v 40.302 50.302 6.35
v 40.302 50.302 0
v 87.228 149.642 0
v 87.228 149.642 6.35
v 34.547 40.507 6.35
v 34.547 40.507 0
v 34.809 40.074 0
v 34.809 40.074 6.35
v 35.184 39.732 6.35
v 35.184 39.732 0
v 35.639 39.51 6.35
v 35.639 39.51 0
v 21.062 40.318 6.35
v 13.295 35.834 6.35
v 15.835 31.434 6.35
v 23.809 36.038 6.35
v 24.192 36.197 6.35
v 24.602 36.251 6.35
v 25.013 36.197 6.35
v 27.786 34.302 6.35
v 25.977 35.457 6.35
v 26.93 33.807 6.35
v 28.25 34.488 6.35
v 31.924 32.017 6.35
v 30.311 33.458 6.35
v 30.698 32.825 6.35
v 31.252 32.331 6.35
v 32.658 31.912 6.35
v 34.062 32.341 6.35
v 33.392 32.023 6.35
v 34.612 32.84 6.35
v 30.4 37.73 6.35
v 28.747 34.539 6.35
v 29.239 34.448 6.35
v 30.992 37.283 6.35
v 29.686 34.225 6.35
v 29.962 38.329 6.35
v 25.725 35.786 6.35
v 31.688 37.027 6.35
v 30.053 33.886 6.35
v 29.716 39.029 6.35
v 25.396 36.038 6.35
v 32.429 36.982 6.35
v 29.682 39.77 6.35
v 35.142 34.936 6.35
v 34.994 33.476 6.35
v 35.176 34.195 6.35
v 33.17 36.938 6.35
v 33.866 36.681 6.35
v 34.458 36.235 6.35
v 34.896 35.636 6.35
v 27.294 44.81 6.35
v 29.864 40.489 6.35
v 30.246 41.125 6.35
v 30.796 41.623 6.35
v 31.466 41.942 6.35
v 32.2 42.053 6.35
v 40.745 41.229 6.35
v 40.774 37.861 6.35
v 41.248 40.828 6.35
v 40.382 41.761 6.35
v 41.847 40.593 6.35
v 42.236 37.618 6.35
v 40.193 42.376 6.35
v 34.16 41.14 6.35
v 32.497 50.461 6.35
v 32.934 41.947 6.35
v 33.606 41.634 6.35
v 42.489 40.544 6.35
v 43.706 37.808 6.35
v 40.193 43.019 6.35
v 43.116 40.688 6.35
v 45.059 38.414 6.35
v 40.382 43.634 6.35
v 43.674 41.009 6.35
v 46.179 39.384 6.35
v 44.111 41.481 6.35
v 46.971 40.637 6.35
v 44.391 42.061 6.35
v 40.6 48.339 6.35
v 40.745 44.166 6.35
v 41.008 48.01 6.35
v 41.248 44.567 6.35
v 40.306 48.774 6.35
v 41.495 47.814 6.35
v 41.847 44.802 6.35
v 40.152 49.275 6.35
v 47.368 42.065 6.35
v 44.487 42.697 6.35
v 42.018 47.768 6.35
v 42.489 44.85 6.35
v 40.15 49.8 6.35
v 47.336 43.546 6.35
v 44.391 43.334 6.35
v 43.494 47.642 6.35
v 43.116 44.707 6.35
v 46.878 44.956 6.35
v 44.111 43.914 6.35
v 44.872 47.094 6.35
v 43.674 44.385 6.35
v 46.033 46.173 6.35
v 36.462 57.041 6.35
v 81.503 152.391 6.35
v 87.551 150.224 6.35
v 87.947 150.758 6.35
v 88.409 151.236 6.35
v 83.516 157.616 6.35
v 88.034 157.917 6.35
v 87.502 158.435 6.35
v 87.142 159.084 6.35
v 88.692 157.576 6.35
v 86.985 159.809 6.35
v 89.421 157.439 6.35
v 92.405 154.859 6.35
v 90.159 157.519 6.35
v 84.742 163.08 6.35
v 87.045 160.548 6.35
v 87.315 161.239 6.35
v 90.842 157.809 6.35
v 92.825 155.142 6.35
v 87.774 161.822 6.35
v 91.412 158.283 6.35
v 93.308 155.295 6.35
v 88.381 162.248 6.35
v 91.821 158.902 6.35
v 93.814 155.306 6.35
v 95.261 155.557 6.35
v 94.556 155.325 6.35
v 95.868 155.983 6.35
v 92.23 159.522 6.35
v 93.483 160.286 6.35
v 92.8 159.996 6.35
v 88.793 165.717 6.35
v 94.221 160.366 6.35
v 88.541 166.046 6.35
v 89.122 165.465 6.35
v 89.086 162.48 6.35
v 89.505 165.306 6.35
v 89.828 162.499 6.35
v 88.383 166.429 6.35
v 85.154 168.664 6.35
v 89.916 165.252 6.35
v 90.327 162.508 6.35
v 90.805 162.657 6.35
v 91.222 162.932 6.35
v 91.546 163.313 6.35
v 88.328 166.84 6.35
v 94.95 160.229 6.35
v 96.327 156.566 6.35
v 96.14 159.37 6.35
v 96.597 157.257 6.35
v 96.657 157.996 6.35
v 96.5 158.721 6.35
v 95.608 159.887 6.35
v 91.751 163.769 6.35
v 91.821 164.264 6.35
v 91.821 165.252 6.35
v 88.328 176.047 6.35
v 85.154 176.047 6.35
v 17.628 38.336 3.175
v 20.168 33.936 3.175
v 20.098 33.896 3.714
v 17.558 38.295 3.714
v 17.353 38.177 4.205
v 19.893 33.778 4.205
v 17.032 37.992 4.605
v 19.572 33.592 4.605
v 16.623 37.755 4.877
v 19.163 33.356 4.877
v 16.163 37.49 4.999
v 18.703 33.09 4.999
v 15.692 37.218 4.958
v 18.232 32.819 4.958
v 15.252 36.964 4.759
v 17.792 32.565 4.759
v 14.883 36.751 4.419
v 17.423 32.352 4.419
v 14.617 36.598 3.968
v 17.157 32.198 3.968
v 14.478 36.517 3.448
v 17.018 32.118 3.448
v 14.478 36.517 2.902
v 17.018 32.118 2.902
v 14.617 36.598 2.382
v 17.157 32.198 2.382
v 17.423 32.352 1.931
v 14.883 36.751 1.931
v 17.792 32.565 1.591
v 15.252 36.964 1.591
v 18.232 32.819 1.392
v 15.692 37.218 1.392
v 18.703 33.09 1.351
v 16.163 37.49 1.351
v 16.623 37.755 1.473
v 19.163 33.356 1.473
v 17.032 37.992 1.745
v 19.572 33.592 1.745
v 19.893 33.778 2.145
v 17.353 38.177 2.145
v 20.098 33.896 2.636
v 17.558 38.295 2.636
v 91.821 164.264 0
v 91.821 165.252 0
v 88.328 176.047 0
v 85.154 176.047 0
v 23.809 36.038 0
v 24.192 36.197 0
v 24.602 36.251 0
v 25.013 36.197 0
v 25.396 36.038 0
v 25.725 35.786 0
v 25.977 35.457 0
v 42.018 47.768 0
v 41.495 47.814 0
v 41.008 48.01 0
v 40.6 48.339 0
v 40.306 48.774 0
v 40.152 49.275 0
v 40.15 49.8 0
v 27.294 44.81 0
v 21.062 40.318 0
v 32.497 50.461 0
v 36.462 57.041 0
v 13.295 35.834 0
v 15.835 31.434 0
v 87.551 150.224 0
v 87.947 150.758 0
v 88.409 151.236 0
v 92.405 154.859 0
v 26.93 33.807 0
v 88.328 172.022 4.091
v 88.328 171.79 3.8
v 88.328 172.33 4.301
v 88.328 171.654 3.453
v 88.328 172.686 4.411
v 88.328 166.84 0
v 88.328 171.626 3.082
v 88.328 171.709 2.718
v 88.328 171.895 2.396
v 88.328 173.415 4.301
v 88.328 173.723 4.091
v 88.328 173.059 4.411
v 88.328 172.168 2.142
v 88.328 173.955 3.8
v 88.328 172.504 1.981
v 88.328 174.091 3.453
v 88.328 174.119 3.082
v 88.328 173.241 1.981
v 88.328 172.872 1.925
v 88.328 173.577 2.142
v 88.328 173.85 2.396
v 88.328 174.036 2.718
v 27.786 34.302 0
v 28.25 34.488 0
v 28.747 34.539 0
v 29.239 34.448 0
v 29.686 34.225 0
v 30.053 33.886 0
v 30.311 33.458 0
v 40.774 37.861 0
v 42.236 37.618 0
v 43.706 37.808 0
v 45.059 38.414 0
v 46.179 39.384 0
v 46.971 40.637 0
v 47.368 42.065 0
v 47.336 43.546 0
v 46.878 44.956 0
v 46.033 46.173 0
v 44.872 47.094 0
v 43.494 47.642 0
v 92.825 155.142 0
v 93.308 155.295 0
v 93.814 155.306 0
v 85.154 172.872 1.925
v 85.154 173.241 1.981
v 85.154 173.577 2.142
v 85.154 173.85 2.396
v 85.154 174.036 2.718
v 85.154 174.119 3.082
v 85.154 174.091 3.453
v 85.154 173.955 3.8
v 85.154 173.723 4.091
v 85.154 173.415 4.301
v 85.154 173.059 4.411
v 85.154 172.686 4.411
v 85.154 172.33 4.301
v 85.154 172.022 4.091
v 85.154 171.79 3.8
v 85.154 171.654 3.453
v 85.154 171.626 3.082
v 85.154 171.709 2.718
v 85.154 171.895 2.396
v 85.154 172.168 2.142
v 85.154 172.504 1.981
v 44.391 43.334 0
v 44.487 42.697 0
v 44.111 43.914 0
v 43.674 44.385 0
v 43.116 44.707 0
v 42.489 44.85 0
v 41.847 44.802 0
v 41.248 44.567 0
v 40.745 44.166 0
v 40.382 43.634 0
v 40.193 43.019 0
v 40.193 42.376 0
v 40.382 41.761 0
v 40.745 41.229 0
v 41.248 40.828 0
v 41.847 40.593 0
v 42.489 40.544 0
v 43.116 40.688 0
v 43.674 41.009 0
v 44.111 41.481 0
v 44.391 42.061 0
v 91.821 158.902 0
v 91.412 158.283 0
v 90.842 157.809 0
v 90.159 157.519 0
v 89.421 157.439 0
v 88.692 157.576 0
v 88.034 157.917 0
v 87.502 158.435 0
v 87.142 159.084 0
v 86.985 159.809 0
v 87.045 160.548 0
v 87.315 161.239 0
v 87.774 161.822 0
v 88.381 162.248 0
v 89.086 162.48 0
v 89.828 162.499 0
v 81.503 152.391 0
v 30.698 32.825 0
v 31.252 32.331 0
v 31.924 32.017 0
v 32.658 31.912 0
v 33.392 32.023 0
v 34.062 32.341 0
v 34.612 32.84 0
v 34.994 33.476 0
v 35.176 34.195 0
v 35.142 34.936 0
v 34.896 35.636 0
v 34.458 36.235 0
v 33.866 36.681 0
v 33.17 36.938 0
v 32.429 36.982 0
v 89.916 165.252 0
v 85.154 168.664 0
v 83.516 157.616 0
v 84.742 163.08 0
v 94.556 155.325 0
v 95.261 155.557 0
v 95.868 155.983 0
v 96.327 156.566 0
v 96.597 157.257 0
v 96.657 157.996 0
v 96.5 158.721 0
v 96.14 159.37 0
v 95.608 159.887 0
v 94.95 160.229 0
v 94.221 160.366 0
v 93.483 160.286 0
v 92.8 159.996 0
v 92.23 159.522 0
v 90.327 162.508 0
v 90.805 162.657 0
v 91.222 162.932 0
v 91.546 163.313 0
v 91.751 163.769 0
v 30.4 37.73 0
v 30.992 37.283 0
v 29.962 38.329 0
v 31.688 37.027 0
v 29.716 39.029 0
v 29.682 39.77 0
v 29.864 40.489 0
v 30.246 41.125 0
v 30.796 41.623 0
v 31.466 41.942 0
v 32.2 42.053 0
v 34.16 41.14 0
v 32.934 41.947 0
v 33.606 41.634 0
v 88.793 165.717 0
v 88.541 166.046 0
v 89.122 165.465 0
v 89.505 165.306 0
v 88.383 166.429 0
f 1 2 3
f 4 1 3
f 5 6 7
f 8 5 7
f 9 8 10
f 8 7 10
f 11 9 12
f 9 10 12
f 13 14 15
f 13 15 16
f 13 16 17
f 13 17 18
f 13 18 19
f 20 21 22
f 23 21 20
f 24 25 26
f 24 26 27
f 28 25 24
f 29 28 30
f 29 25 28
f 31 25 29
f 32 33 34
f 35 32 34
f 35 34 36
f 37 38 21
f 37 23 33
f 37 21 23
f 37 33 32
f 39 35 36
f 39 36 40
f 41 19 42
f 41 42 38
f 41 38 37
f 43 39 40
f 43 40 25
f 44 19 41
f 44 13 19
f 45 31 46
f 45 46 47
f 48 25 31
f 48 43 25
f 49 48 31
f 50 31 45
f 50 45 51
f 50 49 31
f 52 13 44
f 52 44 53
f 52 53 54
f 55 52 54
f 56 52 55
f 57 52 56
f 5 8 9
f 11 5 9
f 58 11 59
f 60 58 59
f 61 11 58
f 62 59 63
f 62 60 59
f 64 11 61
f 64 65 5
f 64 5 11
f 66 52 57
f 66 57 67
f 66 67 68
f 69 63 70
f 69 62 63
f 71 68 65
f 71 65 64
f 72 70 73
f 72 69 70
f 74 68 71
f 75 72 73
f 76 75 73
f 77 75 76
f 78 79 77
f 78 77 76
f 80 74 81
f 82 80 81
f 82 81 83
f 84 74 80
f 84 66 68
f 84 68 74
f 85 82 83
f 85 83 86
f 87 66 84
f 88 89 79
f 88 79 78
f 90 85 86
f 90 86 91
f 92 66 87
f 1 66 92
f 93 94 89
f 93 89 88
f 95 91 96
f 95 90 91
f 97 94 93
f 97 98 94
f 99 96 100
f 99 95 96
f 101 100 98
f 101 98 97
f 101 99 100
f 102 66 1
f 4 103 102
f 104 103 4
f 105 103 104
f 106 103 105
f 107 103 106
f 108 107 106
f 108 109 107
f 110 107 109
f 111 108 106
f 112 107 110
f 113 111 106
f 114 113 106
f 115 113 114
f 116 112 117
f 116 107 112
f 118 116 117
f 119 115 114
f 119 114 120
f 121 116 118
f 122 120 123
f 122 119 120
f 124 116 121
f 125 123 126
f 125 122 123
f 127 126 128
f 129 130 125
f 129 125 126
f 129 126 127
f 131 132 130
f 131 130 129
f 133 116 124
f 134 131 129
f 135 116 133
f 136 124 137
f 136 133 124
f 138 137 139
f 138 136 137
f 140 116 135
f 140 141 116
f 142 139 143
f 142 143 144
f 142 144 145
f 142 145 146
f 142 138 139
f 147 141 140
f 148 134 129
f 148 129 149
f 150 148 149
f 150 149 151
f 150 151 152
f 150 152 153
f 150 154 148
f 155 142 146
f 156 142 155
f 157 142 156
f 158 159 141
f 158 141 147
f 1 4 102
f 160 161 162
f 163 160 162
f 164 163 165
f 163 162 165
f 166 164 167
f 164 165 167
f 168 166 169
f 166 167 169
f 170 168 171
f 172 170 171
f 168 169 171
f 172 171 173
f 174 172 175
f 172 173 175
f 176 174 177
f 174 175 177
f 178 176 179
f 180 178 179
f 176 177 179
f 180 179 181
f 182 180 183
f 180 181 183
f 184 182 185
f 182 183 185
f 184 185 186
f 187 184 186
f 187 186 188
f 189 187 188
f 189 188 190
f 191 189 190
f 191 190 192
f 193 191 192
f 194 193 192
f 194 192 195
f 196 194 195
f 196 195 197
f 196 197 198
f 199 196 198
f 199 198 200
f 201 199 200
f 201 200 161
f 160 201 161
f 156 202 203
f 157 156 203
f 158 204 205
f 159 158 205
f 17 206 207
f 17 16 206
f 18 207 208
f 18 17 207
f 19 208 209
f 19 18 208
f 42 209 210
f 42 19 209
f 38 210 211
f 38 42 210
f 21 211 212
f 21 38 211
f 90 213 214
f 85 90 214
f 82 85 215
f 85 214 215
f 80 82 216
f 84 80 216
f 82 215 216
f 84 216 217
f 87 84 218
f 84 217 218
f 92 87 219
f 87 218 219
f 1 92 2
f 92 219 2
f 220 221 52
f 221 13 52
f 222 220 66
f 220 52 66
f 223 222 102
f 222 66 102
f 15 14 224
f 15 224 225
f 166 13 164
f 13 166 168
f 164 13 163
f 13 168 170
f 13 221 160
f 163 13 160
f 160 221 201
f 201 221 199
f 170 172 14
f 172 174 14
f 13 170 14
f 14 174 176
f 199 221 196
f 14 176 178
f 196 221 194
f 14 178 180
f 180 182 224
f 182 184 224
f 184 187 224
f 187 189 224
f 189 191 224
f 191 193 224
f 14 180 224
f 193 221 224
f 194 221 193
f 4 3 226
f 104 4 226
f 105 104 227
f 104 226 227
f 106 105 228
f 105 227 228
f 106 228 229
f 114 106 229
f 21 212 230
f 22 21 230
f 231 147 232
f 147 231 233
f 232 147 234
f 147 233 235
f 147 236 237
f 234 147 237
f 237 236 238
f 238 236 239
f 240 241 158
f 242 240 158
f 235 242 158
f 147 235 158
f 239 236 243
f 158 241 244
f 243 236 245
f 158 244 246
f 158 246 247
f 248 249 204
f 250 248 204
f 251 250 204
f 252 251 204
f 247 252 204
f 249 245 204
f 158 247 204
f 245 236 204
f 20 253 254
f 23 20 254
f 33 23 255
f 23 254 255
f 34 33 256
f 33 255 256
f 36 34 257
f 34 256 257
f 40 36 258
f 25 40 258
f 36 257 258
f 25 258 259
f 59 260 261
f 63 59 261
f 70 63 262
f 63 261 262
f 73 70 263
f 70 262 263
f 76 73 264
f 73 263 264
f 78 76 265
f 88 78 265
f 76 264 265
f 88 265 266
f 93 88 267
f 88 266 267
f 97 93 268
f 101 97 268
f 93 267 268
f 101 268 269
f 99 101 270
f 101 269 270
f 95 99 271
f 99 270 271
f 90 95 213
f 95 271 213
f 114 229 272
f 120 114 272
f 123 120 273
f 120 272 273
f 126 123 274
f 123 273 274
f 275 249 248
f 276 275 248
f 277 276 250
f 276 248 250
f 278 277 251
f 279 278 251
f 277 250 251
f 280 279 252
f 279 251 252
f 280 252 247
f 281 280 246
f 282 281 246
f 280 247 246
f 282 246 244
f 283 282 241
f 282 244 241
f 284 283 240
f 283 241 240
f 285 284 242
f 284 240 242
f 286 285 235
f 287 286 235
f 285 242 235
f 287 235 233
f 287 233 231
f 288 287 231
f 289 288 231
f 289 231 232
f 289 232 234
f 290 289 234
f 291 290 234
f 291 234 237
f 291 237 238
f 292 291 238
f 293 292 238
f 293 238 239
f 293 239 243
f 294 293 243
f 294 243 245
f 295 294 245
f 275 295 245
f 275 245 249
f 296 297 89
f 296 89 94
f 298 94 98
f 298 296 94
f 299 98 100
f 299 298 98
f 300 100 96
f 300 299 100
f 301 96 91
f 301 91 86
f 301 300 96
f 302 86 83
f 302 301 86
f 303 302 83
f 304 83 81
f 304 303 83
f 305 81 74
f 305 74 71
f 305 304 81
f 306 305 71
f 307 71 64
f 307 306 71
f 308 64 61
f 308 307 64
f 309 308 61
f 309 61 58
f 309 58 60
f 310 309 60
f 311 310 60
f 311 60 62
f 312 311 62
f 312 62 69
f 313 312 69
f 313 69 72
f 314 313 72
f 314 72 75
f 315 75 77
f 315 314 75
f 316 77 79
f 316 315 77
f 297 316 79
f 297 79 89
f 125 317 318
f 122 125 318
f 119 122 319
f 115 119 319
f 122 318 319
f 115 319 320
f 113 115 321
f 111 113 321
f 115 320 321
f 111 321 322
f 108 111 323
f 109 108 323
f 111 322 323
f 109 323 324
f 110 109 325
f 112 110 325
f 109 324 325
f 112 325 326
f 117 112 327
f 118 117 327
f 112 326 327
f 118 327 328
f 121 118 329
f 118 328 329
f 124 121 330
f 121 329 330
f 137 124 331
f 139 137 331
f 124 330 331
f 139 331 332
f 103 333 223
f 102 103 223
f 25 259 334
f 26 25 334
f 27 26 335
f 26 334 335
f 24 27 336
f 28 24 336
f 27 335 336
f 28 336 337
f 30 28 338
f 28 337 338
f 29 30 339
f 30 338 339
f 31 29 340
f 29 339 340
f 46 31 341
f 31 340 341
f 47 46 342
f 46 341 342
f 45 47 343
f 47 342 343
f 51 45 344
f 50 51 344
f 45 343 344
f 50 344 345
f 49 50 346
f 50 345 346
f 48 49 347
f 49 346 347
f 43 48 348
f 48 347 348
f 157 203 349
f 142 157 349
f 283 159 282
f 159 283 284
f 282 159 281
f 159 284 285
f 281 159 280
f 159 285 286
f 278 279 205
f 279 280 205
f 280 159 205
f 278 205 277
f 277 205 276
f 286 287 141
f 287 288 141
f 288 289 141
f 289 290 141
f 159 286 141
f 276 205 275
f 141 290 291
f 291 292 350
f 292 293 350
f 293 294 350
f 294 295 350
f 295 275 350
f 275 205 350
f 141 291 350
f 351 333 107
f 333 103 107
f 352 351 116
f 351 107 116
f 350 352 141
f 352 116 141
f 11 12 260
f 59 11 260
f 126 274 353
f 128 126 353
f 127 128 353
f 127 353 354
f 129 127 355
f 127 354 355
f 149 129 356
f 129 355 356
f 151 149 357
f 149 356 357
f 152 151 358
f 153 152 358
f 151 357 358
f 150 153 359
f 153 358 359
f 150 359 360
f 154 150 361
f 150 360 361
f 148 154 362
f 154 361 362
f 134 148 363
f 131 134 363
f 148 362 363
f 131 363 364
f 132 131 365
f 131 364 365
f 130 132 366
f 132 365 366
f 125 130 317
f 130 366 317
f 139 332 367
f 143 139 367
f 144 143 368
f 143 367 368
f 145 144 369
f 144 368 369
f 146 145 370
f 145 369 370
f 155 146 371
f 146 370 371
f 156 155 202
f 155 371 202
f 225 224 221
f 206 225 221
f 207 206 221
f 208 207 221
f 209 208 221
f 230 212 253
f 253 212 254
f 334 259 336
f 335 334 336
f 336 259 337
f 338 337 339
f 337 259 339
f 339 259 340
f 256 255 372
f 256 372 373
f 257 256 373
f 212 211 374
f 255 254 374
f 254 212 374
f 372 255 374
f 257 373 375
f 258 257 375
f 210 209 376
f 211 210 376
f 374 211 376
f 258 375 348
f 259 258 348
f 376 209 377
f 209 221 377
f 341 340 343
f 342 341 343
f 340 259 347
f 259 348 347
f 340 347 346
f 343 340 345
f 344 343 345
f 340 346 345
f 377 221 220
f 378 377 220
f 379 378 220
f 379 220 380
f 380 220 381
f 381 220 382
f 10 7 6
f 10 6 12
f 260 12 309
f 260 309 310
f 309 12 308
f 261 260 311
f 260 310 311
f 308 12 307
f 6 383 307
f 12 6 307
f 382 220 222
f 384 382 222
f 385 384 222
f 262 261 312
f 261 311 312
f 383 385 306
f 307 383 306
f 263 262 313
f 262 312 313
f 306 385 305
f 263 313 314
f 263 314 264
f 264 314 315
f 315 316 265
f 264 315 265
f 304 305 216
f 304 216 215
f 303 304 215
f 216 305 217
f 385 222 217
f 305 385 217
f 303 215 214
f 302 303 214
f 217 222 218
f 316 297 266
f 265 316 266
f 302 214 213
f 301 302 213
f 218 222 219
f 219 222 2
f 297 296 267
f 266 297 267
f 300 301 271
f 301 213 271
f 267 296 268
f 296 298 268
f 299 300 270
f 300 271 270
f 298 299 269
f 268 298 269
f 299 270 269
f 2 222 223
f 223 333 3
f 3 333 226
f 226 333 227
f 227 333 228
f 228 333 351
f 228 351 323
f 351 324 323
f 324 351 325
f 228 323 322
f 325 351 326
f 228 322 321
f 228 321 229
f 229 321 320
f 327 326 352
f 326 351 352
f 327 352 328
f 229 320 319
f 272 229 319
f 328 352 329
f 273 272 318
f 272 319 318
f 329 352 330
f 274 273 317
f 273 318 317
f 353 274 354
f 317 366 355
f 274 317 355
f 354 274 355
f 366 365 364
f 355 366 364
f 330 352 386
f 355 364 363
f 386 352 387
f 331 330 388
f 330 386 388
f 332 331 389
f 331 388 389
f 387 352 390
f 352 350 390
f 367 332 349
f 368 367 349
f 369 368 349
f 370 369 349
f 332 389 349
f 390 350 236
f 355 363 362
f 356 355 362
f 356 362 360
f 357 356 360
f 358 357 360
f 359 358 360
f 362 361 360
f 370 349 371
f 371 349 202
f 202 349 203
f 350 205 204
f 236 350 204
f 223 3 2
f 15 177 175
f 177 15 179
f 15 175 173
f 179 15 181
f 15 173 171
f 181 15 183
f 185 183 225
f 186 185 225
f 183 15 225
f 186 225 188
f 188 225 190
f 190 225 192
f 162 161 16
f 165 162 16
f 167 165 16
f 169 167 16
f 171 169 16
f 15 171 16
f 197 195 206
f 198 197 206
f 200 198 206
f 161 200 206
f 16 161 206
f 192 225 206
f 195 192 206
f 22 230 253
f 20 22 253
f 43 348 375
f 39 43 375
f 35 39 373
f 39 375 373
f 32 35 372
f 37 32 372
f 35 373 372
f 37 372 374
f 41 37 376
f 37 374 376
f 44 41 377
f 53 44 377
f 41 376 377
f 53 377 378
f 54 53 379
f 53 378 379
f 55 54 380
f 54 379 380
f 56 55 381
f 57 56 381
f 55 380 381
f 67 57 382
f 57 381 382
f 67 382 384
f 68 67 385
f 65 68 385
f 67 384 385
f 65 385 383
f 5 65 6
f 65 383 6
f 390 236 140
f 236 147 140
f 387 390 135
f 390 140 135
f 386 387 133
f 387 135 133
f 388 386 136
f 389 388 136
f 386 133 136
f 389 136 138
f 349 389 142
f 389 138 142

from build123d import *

# Parameters (mm, degrees)
SKETCH1_R                 = 2.159
BOSS_EXTRUDE1_DEPTH       = 6.35
SKETCH2_R                 = 1.8288
CUT_EXTRUDE1_DEPTH        = 127.508450551
SKETCH3_R                 = 0.635
CUT_EXTRUDE2_DEPTH        = 76.033777739
FILLET1_R                 = 1.5875
FILLET2_R                 = 38.1
M3X0_5_TAPPED_HOLE1_D     = 2.5
M3X0_5_TAPPED_HOLE1_DEPTH = 7.50062
M3X0_5_TAPPED_HOLE1_TIP   = 0.751075774


with BuildPart() as part:
    # Sketch1 → Boss-Extrude1 (new body)
    with BuildSketch(Plane.XY):
        with BuildLine():
            Line((15.834722261, 31.434493723), (25.183466494, 36.831993723))
            Line((25.183466494, 36.831993723), (26.929716494, 33.8074))
            Line((26.929716494, 33.8074), (27.78608986, 34.301827393))
            ThreePointArc((27.78608986, 34.301827393), (29.23868298, 34.44834582), (30.311273673, 33.457869357))
            ThreePointArc((30.311273673, 33.457869357), (34.825897026, 33.143744407), (32.428977808, 36.9824))
            ThreePointArc((32.428977808, 36.9824), (30.032058591, 40.821055593), (34.546681944, 40.506930643))
            ThreePointArc((34.546681944, 40.506930643), (34.984344673, 39.889437479), (35.639187691, 39.509928464))
            Line((35.639187691, 39.509928464), (40.774282272, 37.860721969))
            ThreePointArc((40.774282272, 37.860721969), (47.368100791, 42.064756802), (42.017768622, 47.767939879))
            ThreePointArc((42.017768622, 47.767939879), (40.437125748, 48.5456558), (40.301653082, 50.302050149))
            Line((40.301653082, 50.302050149), (87.227692295, 149.642175178))
            ThreePointArc((87.227692295, 149.642175178), (87.739785188, 150.497310852), (88.408996906, 151.235993347))
            Line((88.408996906, 151.235993347), (92.404798917, 154.858512458))
            ThreePointArc((92.404798917, 154.858512458), (93.060884875, 155.23586864), (93.814481006, 155.3061491))
            ThreePointArc((93.814481006, 155.3061491), (96.343832869, 159.058865136), (91.821, 158.9024))
            ThreePointArc((91.821, 158.9024), (87.298167131, 158.745934864), (89.827518994, 162.4986509))
            ThreePointArc((89.827518994, 162.4986509), (91.22159212, 162.932303457), (91.821, 164.263545213))
            Line((91.821, 164.263545213), (91.821, 165.2524))
            Line((91.821, 165.2524), (88.3285, 165.2524))
            Line((88.3285, 165.2524), (88.3285, 176.0474))
            Line((88.3285, 176.0474), (85.1535, 176.0474))
            Line((85.1535, 176.0474), (85.1535, 160.118189826))
            Line((85.1535, 160.118189826), (31.375529243, 46.272861553))
            Line((31.375529243, 46.272861553), (13.294722261, 35.833902774))
            Line((13.294722261, 35.833902774), (15.834722261, 31.434493723))
        make_face()
        with Locations((42.327648174, 42.6974)):
            Circle(SKETCH1_R, mode=Mode.SUBTRACT)
    extrude(amount=BOSS_EXTRUDE1_DEPTH)

    # Sketch2 → Cut-Extrude1 (cut, through all)
    with BuildSketch(Plane(origin=(-9.652854494, 16.719234422, 0), x_dir=(-0.866025404, -0.5, 0), z_dir=(0.5, -0.866025404, 0))):
        with Locations(Location((-32.605518601, -3.175, 0), (0, 0, 180))):  # turned: the seam where the file's is
            Circle(SKETCH2_R)
    extrude(amount=-CUT_EXTRUDE1_DEPTH, mode=Mode.SUBTRACT)

    # Sketch3 → Cut-Extrude2 (cut, through all)
    with BuildSketch(Plane(origin=(88.3285, 0, 0), x_dir=(0, 0, -1), z_dir=(1, 0, 0))):
        with Locations((-3.175, 172.8724)):
            Circle(SKETCH3_R)
    extrude(amount=-CUT_EXTRUDE2_DEPTH, mode=Mode.SUBTRACT)

    # Fillet1
    fillet1_edges = [part.edges().sort_by_distance(p)[0] for p in [
        (88.3285, 165.2524, 3.175),
        (25.183466494, 36.831993723, 3.175),
    ]]
    fillet(fillet1_edges, radius=FILLET1_R)

    # Fillet2
    fillet2_edges = [part.edges().sort_by_distance(p)[0] for p in [
        (31.375529243, 46.272861553, 3.175),
        (85.1535, 160.118189826, 3.175),
    ]]
    fillet(fillet2_edges, radius=FILLET2_R)

    # M3x0.5 Tapped Hole1
    with Locations(Plane.ZY.offset(-85.1535)):
        with Locations((3.175, 172.8724)):
            Hole(M3X0_5_TAPPED_HOLE1_D / 2, depth=M3X0_5_TAPPED_HOLE1_DEPTH)
            with Locations((0, 0, -(M3X0_5_TAPPED_HOLE1_DEPTH + M3X0_5_TAPPED_HOLE1_TIP / 2))):  # 118° drill point
                Cone(0, M3X0_5_TAPPED_HOLE1_D / 2, M3X0_5_TAPPED_HOLE1_TIP, mode=Mode.SUBTRACT)


solid = part.part
